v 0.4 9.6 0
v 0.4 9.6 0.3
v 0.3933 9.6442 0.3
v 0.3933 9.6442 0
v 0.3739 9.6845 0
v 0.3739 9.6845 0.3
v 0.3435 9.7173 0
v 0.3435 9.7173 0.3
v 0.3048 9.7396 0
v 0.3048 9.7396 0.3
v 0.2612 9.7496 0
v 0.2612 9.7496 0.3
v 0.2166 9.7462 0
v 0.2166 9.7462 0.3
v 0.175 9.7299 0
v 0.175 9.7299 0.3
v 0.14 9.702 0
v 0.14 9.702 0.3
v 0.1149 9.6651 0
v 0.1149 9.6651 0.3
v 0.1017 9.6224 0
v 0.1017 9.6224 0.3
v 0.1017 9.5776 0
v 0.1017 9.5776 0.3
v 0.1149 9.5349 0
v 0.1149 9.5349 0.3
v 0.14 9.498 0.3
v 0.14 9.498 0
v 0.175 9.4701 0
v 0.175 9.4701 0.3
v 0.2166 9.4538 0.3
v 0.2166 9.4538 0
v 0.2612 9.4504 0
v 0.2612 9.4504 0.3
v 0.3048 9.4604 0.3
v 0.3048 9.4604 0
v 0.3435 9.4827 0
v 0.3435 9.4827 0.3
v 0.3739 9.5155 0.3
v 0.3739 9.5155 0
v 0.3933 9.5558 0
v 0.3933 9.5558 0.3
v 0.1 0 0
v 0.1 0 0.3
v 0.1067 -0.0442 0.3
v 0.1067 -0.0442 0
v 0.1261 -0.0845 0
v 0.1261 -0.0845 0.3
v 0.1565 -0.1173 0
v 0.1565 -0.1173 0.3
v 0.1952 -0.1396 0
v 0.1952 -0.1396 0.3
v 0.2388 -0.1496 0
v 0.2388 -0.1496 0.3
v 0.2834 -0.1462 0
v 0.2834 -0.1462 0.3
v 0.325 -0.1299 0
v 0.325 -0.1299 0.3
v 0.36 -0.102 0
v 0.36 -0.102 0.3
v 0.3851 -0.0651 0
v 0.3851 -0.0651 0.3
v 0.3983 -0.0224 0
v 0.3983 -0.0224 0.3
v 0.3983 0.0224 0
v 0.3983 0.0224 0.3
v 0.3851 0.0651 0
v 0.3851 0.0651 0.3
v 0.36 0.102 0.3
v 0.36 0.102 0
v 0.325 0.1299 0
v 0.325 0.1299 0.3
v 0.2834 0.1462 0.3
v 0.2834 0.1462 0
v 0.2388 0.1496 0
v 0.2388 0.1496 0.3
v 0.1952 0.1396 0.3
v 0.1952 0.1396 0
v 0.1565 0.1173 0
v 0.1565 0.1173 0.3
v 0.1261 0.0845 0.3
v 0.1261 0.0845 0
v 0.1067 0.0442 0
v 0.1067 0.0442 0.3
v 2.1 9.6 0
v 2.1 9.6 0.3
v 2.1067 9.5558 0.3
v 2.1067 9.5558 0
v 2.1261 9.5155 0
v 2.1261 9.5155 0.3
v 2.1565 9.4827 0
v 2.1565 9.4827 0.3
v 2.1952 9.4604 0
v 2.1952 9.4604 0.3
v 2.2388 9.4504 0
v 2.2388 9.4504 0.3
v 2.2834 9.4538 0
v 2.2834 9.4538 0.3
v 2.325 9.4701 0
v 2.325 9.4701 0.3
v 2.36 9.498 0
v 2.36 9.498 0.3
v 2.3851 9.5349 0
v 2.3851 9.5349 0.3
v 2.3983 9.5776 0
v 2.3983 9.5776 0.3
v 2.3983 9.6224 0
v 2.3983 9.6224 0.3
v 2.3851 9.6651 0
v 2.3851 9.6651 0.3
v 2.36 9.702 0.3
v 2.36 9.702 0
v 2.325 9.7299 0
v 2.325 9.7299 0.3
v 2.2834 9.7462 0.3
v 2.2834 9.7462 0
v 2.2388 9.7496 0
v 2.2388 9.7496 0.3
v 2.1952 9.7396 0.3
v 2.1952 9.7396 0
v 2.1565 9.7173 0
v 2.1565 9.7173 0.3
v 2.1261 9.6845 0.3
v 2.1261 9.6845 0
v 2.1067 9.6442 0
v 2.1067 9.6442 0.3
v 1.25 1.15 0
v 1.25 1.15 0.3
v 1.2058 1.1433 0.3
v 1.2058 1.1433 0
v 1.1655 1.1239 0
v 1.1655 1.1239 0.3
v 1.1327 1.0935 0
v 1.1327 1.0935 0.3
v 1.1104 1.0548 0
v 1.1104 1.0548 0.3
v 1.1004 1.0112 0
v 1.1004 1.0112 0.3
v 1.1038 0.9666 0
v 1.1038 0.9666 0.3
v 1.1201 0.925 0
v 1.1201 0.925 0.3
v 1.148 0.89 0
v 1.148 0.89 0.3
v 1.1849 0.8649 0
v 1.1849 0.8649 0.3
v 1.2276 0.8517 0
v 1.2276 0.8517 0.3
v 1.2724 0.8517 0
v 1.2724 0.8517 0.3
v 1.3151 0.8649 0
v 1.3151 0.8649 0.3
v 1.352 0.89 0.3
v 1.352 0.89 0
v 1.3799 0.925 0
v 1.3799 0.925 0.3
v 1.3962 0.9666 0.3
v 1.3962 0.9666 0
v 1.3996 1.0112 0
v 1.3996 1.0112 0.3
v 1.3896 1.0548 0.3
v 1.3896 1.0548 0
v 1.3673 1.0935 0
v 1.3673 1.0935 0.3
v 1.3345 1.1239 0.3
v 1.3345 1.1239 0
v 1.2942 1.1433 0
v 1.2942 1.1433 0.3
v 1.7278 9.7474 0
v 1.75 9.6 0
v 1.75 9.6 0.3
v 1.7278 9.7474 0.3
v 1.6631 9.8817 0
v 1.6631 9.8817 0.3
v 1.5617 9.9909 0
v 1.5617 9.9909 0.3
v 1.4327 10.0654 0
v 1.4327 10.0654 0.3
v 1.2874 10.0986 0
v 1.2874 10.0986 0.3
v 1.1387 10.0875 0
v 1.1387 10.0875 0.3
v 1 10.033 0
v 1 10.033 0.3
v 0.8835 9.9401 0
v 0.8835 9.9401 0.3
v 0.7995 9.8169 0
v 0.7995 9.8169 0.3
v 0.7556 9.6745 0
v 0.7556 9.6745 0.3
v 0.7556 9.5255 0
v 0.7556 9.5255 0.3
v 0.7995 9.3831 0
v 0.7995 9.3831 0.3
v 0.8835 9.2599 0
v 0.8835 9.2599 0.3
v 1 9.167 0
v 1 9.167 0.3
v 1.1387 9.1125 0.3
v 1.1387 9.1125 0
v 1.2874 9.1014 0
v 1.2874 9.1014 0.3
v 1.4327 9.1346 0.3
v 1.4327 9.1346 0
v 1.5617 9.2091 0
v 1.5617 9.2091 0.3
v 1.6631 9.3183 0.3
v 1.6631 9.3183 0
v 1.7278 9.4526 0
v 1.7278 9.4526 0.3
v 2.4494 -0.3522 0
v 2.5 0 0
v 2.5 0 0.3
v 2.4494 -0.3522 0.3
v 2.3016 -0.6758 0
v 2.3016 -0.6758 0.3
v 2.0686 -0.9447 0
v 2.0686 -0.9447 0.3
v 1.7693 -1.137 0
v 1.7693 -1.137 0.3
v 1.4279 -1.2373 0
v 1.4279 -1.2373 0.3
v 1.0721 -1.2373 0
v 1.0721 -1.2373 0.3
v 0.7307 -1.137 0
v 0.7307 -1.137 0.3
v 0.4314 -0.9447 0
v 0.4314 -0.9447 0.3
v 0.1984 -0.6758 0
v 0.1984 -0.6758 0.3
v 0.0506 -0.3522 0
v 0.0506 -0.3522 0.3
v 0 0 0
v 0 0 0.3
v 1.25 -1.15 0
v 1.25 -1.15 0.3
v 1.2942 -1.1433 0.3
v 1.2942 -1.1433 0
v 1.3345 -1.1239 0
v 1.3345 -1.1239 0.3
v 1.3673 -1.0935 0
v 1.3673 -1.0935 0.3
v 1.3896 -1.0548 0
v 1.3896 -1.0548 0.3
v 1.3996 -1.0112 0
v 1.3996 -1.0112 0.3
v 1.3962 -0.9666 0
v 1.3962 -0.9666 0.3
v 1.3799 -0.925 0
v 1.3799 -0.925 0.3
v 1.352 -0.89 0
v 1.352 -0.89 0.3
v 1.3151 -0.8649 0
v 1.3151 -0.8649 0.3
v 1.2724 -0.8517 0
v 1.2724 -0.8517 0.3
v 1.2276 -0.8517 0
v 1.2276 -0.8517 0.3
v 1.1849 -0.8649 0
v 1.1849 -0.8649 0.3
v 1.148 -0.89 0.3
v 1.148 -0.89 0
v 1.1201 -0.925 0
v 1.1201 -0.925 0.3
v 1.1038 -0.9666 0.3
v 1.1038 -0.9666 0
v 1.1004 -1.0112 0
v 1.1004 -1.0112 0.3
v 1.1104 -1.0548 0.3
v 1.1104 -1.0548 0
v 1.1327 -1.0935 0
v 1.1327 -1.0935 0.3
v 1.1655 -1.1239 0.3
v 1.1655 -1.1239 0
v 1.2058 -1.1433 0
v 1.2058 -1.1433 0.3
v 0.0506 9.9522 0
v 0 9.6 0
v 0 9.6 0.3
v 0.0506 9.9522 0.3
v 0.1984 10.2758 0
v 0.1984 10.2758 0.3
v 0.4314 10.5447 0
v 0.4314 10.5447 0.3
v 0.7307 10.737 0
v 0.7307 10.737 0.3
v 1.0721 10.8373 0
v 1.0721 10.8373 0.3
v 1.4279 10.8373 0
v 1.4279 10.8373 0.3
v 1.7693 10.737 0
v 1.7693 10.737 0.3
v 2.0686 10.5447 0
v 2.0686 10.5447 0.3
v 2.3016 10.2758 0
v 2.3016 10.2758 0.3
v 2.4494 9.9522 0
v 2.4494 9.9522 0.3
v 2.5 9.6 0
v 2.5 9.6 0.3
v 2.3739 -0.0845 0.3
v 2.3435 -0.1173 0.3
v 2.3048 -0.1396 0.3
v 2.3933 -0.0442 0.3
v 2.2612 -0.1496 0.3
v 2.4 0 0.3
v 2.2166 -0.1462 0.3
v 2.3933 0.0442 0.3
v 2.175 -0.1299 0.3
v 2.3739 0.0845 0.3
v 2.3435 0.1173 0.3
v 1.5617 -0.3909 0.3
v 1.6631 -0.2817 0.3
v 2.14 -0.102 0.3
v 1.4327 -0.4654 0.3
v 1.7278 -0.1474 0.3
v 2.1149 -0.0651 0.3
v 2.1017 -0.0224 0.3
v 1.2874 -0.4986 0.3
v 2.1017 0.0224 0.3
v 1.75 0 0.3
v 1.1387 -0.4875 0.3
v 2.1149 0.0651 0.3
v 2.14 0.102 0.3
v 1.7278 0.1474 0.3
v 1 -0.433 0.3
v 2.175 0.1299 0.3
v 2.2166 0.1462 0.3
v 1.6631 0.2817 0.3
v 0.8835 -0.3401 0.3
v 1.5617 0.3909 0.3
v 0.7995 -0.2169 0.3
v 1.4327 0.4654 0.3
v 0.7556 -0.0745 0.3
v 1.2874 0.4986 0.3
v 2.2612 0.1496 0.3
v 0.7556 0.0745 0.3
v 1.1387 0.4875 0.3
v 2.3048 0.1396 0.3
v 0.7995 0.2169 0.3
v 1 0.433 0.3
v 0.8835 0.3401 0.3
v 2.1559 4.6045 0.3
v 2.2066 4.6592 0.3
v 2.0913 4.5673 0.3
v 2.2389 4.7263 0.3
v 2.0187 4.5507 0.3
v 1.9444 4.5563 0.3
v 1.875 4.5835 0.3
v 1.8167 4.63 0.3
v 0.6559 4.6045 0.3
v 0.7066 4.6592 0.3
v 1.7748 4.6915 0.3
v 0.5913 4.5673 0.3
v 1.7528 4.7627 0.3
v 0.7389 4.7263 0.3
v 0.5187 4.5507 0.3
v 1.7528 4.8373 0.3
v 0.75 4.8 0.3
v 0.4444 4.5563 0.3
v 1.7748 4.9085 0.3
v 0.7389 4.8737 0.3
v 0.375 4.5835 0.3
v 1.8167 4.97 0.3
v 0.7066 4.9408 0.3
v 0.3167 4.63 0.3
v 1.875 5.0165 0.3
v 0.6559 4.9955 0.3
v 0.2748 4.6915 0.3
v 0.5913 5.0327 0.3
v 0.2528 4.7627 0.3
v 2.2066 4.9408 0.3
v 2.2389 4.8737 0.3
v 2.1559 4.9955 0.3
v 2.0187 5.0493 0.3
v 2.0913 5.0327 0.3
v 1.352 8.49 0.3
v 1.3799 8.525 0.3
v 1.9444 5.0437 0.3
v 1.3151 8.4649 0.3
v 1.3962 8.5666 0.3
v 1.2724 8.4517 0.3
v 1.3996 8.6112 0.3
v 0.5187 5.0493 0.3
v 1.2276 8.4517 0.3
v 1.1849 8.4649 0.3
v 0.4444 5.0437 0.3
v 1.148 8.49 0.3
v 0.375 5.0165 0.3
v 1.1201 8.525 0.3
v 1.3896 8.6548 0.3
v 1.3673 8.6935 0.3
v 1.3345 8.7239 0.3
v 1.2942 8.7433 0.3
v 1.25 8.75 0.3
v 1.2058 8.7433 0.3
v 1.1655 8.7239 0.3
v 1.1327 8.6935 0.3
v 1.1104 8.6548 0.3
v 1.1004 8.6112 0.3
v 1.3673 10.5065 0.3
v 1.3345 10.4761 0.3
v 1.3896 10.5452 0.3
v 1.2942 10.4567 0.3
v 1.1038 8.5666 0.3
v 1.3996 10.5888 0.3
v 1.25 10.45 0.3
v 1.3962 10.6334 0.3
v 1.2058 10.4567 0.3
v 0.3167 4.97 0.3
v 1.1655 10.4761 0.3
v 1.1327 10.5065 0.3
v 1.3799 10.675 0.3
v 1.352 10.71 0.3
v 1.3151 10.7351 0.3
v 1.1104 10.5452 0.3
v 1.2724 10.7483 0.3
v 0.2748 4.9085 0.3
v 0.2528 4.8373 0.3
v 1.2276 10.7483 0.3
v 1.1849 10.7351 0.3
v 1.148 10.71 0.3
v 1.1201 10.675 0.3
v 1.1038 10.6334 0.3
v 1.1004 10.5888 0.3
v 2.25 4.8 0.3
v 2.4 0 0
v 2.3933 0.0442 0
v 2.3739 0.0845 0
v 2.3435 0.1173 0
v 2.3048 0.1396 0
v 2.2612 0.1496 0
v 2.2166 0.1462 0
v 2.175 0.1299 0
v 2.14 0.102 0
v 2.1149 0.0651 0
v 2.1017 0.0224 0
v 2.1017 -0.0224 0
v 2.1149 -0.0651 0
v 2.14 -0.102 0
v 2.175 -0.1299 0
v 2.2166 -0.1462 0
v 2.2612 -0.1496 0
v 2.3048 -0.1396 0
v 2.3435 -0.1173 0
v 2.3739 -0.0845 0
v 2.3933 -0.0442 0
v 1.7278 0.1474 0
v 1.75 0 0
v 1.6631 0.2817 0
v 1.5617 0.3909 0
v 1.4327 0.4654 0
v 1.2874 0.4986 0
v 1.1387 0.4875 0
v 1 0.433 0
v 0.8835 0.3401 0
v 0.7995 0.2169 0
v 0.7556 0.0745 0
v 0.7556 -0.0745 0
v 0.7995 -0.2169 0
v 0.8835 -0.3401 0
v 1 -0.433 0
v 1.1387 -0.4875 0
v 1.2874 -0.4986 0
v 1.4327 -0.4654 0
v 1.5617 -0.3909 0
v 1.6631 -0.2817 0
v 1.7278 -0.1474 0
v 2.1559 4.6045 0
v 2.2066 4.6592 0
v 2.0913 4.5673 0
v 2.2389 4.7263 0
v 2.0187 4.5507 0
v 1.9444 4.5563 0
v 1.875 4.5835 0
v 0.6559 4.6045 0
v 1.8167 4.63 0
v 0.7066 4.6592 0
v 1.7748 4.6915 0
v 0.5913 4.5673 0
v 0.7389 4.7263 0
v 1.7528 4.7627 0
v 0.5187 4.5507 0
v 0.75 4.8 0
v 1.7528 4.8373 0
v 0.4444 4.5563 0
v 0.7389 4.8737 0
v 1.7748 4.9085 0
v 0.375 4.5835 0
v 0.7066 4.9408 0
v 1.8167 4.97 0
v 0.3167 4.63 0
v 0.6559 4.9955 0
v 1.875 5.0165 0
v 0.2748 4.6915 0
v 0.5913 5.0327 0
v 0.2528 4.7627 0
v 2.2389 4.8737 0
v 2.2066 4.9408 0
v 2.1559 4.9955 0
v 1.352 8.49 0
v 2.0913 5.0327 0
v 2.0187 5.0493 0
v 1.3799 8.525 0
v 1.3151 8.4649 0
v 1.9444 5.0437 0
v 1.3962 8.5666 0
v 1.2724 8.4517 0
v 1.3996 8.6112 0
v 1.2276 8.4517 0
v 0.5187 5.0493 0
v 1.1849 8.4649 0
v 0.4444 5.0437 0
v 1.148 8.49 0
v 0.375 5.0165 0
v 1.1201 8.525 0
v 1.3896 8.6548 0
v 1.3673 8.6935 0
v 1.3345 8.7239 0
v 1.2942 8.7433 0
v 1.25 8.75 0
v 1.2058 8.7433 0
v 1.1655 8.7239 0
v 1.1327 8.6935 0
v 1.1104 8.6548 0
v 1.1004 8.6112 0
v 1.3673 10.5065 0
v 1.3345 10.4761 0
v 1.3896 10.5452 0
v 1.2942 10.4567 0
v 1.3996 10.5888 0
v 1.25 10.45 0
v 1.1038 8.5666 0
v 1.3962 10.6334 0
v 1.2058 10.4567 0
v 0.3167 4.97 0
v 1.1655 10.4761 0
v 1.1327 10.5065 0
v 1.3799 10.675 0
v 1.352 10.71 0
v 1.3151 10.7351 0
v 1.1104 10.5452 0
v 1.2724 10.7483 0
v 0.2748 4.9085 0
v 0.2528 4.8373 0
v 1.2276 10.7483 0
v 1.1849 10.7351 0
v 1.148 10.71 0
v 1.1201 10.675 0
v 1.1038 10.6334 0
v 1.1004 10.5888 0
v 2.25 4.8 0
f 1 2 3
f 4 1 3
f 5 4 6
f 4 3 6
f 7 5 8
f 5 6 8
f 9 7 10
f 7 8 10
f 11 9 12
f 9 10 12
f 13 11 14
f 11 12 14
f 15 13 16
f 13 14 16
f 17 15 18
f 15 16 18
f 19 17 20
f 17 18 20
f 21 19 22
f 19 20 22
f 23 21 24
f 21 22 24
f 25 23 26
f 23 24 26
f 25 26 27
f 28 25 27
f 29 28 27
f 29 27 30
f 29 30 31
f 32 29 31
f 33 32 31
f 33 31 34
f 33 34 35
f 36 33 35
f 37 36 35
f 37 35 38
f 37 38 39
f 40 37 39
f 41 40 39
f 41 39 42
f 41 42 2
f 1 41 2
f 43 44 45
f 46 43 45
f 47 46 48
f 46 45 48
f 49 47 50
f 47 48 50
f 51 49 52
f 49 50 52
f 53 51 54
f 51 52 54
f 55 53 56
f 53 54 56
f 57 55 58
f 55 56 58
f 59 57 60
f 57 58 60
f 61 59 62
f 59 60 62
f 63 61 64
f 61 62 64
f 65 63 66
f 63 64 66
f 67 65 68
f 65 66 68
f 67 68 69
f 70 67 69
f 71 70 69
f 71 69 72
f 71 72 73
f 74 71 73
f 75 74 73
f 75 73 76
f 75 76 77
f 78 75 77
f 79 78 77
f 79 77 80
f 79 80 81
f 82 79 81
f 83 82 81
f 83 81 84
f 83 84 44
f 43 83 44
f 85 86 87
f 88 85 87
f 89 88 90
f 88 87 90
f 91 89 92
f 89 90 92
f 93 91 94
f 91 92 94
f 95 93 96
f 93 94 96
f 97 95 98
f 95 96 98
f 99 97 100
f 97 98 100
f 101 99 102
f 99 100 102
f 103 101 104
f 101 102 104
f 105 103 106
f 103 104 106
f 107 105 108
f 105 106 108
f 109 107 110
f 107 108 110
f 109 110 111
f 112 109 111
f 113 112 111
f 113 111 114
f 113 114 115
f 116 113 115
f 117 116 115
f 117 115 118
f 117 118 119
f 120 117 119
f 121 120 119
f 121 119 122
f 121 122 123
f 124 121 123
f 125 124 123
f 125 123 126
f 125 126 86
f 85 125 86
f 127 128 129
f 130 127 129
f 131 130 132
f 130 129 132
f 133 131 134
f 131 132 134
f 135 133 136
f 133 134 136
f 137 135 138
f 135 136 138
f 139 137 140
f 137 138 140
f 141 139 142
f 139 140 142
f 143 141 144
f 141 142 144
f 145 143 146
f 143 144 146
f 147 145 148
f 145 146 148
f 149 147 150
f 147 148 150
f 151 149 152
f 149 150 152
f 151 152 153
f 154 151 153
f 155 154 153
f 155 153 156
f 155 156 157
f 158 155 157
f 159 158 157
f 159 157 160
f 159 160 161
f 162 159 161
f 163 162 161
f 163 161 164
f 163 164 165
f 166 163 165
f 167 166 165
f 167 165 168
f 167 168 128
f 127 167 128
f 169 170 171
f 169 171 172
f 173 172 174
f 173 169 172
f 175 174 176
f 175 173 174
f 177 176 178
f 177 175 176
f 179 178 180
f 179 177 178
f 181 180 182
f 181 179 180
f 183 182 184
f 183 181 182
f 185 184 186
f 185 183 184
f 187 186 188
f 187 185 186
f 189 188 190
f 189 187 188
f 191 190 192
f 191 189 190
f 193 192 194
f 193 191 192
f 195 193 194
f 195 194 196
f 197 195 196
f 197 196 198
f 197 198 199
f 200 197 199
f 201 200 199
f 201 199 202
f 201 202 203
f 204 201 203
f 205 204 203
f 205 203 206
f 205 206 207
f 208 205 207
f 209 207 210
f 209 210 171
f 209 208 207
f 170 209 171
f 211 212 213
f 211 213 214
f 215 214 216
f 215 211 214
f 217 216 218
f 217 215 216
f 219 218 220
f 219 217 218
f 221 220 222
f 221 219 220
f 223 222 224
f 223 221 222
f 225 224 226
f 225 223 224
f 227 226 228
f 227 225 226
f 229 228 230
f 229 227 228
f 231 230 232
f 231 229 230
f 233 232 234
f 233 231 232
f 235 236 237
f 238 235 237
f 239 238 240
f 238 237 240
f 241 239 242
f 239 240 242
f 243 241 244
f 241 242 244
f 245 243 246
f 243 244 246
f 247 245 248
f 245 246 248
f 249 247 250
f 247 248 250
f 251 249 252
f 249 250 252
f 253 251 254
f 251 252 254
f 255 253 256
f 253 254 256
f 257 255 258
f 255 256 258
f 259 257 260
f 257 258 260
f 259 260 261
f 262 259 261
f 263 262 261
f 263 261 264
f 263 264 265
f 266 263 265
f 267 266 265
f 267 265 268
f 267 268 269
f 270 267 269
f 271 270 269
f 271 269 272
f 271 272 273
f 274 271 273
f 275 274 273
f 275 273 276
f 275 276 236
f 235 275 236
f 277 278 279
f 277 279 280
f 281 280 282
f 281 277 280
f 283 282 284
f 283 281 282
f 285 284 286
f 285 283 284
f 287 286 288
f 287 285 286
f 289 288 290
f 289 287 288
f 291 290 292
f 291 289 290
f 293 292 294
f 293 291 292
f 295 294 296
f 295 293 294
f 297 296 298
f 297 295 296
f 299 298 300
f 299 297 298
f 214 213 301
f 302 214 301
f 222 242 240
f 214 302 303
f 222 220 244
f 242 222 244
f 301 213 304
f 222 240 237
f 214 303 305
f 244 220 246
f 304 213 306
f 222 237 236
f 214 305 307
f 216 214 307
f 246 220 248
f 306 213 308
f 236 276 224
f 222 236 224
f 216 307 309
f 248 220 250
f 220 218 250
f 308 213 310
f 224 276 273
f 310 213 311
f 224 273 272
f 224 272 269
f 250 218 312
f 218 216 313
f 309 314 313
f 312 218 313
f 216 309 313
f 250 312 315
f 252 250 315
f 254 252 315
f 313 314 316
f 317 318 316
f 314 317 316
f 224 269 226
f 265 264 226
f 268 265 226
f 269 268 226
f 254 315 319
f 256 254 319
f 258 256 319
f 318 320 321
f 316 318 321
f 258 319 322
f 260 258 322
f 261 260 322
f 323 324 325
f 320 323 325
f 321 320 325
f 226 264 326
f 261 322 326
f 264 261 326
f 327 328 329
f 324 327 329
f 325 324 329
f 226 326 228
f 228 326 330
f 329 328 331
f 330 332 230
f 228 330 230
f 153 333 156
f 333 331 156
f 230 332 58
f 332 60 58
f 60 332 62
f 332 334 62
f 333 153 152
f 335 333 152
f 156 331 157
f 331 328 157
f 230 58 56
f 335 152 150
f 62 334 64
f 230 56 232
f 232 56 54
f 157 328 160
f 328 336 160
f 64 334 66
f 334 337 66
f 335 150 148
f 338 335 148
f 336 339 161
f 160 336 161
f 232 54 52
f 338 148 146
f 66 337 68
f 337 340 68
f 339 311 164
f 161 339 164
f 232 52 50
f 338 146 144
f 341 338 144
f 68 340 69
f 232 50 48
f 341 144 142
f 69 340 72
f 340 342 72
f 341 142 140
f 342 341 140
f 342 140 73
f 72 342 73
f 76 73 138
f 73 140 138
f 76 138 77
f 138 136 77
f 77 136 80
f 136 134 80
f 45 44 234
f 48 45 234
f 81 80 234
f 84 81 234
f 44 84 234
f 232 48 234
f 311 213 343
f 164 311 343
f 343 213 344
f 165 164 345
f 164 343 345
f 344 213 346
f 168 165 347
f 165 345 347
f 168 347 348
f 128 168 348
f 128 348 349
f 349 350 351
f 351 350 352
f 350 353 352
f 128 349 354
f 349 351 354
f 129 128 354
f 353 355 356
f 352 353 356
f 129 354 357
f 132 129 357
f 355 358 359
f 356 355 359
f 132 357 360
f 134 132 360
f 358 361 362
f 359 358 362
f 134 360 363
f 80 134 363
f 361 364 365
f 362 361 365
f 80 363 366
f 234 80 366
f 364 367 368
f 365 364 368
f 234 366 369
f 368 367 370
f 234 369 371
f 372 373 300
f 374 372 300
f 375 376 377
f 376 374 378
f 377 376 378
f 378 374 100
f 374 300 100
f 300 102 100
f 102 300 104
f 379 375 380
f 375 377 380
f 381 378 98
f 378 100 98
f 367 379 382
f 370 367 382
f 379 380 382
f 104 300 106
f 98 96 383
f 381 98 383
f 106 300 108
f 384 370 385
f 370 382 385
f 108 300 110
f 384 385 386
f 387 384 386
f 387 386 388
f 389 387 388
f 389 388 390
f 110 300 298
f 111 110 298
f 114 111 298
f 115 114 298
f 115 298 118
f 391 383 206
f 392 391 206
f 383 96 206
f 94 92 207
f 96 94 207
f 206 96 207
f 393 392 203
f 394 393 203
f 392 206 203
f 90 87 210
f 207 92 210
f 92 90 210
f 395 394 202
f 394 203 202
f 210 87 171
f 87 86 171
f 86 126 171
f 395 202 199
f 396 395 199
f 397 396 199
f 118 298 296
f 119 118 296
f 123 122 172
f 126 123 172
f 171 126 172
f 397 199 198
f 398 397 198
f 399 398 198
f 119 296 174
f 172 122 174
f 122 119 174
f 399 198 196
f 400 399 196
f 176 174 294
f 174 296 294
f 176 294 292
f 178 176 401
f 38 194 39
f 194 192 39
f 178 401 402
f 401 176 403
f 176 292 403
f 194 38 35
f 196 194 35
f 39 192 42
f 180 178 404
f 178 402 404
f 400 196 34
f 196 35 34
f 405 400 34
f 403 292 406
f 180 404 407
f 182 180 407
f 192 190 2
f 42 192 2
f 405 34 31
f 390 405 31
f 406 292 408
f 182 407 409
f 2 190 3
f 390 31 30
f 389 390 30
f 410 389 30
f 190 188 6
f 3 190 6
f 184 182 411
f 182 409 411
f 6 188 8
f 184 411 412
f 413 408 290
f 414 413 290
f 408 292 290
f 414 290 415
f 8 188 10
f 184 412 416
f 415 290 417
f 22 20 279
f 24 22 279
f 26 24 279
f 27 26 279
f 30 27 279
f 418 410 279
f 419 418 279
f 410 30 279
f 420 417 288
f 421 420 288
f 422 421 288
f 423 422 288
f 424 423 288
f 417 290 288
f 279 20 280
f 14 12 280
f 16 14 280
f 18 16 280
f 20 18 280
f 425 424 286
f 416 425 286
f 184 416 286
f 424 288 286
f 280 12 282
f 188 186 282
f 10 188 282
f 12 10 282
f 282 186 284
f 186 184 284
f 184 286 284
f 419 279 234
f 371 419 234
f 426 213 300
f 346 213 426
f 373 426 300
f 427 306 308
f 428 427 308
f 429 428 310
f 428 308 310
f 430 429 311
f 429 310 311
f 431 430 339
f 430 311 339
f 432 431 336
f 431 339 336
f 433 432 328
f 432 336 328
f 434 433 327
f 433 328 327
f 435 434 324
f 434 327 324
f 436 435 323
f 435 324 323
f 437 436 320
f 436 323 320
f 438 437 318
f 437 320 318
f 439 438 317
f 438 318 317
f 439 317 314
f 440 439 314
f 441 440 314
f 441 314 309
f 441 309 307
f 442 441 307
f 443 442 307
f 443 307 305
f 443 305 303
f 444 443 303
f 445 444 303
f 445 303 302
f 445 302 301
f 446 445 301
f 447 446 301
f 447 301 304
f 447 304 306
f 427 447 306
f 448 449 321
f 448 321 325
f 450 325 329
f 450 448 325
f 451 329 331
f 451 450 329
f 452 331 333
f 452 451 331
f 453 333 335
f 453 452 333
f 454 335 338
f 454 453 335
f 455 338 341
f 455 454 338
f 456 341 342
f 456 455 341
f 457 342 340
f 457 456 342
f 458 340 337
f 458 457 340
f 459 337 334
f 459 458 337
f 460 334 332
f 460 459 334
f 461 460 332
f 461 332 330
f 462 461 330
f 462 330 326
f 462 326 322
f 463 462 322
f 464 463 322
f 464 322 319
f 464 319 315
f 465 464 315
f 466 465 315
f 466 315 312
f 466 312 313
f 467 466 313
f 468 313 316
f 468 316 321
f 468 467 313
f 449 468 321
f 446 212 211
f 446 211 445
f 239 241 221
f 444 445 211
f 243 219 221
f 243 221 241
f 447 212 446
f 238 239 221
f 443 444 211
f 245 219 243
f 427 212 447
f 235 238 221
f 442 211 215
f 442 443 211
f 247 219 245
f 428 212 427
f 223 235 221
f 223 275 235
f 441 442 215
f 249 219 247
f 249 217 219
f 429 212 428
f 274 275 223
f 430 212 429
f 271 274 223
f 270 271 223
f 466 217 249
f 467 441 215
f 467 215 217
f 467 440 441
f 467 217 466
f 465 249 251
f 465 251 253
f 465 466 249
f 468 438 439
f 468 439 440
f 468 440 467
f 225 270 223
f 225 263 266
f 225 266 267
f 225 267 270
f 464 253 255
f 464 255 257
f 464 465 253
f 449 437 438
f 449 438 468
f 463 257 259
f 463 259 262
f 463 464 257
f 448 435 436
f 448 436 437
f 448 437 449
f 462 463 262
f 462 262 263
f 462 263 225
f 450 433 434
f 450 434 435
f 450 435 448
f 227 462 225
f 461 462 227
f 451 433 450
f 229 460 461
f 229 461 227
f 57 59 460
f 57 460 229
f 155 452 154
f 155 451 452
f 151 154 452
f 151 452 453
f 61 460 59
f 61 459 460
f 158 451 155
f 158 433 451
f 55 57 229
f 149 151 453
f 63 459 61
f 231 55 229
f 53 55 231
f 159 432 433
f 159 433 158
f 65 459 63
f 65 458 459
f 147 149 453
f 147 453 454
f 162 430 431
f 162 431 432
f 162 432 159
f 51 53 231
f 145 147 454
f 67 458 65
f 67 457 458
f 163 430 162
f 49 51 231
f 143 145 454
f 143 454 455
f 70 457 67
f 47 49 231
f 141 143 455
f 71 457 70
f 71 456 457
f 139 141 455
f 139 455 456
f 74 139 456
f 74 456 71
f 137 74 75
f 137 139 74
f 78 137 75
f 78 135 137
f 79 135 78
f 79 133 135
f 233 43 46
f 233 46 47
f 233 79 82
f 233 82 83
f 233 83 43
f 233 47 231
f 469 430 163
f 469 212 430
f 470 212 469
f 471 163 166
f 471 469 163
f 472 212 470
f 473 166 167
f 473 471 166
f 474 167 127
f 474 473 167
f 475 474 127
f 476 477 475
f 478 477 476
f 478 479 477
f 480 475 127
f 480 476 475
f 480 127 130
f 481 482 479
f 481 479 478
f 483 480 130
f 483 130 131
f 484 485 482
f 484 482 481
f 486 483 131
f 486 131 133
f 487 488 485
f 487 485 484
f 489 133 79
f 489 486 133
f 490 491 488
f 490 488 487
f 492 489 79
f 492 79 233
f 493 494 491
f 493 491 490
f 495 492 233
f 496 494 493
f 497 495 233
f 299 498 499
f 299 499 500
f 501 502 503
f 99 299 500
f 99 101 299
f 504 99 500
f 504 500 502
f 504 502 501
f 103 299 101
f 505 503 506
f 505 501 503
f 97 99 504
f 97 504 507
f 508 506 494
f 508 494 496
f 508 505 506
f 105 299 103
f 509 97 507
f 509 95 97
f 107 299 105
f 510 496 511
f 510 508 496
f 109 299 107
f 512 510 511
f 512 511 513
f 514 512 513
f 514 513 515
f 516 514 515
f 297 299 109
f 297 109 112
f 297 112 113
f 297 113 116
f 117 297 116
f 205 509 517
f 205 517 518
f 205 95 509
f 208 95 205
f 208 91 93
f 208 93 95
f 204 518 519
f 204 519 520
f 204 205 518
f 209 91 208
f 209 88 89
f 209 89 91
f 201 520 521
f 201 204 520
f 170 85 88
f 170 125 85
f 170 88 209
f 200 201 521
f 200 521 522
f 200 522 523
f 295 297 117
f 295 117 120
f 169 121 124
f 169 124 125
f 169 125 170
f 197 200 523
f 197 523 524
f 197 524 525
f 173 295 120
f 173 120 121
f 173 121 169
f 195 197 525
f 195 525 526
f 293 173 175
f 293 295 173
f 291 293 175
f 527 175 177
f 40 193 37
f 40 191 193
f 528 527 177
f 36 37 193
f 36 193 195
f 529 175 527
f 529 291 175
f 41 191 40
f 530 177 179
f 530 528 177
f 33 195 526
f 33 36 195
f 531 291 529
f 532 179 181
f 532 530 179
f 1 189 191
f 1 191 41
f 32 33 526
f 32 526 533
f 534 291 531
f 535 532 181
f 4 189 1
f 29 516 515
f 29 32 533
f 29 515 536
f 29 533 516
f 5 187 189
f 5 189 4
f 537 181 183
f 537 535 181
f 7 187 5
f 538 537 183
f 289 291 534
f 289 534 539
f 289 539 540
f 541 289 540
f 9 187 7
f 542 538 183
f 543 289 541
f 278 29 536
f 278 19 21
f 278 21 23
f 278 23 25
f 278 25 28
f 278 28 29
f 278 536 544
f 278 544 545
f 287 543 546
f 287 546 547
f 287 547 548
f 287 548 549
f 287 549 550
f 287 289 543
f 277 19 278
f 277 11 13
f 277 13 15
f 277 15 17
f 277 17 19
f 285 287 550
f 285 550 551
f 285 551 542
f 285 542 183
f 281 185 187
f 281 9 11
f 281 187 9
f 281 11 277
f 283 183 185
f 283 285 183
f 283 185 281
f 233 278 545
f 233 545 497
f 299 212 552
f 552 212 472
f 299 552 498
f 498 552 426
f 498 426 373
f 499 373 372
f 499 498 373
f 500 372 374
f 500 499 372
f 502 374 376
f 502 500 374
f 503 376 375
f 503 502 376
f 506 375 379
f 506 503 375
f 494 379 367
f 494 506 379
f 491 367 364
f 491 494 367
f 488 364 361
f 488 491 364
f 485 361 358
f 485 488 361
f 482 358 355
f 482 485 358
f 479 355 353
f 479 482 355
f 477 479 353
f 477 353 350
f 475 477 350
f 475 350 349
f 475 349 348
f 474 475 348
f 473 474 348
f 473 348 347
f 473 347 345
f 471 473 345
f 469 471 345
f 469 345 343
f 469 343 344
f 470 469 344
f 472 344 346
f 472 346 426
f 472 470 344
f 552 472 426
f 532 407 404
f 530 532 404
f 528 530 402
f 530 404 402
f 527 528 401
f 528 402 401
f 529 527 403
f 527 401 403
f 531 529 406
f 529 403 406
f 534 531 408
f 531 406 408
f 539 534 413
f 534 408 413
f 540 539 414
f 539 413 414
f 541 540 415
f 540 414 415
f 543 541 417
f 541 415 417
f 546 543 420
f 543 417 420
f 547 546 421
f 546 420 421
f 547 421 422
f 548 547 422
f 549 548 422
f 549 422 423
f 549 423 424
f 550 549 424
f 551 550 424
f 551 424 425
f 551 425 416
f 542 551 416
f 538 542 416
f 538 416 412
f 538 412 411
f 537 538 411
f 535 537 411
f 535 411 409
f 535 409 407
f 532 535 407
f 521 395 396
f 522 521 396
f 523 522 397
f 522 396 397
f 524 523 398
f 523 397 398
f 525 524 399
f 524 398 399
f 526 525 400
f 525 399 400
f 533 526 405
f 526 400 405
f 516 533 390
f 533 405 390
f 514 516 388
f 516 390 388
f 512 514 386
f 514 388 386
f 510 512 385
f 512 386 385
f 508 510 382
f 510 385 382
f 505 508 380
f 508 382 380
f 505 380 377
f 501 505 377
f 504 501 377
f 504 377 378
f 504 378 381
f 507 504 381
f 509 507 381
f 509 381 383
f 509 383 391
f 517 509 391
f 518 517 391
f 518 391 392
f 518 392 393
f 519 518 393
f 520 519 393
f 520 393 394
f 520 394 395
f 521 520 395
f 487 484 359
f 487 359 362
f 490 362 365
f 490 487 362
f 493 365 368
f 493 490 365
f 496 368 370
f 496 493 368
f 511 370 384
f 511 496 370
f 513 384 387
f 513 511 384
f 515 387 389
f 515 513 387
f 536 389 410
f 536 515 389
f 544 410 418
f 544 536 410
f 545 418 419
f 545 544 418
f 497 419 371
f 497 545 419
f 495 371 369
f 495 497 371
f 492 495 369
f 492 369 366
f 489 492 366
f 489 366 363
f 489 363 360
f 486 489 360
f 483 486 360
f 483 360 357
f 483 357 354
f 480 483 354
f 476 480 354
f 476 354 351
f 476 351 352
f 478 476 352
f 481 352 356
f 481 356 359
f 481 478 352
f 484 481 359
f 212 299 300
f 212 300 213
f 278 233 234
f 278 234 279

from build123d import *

# Parameters (mm, degrees)
SKETCH1_R           = 0.5
SKETCH1_R_2         = 0.25
BOSS_EXTRUDE2_DEPTH = 0.3
SKETCH2_R           = 0.15
CUT_EXTRUDE1_DEPTH  = 10
CIRPATTERN2_COUNT   = 4
SKETCH3_R           = 0.15
CUT_EXTRUDE2_DEPTH  = 10
CIRPATTERN3_COUNT   = 4


with BuildPart() as part:
    # Sketch1 → Boss-Extrude2 (new body)
    with BuildSketch(Plane.XY):
        with BuildLine():
            Line((0, 0), (0, 9.6))
            ThreePointArc((0, 9.6), (1.25, 10.85), (2.5, 9.6))
            Line((2.5, 9.6), (2.5, 0))
            ThreePointArc((2.5, 0), (1.25, -1.25), (0, 0))
        make_face()
        with Locations((1.25, 9.6)):
            Circle(SKETCH1_R, mode=Mode.SUBTRACT)
        with Locations((1.25, 0)):
            Circle(SKETCH1_R, mode=Mode.SUBTRACT)
        with Locations((0.5, 4.8)):
            Circle(SKETCH1_R_2, mode=Mode.SUBTRACT)
        with Locations((2, 4.8)):
            Circle(SKETCH1_R_2, mode=Mode.SUBTRACT)
    extrude(amount=BOSS_EXTRUDE2_DEPTH)

    # Sketch2 → Cut-Extrude1 (cut)
    with BuildSketch(Plane.XY.offset(0.3)):
        with Locations((0.25, 9.6)):
            Circle(SKETCH2_R)
    cut_extrude1 = extrude(amount=-CUT_EXTRUDE1_DEPTH, mode=Mode.SUBTRACT)

    # CirPattern2: Cut-Extrude1 ×4 about axis
    cirpattern2_axis = Axis((1.25, 9.6, 0), (0, 0, 1))
    for i in range(1, CIRPATTERN2_COUNT):
        add(cut_extrude1.rotate(cirpattern2_axis, i * 360 / CIRPATTERN2_COUNT), mode=Mode.SUBTRACT)

    # Sketch3 → Cut-Extrude2 (cut)
    with BuildSketch(Plane.XY.offset(0.3)):
        with Locations((2.25, 0)):
            Circle(SKETCH3_R)
    cut_extrude2 = extrude(amount=-CUT_EXTRUDE2_DEPTH, mode=Mode.SUBTRACT)

    # CirPattern3: Cut-Extrude2 ×4 about axis
    cirpattern3_axis = Axis((1.25, 0, 0), (0, 0, 1))
    for i in range(1, CIRPATTERN3_COUNT):
        add(cut_extrude2.rotate(cirpattern3_axis, i * 360 / CIRPATTERN3_COUNT), mode=Mode.SUBTRACT)


solid = part.part
